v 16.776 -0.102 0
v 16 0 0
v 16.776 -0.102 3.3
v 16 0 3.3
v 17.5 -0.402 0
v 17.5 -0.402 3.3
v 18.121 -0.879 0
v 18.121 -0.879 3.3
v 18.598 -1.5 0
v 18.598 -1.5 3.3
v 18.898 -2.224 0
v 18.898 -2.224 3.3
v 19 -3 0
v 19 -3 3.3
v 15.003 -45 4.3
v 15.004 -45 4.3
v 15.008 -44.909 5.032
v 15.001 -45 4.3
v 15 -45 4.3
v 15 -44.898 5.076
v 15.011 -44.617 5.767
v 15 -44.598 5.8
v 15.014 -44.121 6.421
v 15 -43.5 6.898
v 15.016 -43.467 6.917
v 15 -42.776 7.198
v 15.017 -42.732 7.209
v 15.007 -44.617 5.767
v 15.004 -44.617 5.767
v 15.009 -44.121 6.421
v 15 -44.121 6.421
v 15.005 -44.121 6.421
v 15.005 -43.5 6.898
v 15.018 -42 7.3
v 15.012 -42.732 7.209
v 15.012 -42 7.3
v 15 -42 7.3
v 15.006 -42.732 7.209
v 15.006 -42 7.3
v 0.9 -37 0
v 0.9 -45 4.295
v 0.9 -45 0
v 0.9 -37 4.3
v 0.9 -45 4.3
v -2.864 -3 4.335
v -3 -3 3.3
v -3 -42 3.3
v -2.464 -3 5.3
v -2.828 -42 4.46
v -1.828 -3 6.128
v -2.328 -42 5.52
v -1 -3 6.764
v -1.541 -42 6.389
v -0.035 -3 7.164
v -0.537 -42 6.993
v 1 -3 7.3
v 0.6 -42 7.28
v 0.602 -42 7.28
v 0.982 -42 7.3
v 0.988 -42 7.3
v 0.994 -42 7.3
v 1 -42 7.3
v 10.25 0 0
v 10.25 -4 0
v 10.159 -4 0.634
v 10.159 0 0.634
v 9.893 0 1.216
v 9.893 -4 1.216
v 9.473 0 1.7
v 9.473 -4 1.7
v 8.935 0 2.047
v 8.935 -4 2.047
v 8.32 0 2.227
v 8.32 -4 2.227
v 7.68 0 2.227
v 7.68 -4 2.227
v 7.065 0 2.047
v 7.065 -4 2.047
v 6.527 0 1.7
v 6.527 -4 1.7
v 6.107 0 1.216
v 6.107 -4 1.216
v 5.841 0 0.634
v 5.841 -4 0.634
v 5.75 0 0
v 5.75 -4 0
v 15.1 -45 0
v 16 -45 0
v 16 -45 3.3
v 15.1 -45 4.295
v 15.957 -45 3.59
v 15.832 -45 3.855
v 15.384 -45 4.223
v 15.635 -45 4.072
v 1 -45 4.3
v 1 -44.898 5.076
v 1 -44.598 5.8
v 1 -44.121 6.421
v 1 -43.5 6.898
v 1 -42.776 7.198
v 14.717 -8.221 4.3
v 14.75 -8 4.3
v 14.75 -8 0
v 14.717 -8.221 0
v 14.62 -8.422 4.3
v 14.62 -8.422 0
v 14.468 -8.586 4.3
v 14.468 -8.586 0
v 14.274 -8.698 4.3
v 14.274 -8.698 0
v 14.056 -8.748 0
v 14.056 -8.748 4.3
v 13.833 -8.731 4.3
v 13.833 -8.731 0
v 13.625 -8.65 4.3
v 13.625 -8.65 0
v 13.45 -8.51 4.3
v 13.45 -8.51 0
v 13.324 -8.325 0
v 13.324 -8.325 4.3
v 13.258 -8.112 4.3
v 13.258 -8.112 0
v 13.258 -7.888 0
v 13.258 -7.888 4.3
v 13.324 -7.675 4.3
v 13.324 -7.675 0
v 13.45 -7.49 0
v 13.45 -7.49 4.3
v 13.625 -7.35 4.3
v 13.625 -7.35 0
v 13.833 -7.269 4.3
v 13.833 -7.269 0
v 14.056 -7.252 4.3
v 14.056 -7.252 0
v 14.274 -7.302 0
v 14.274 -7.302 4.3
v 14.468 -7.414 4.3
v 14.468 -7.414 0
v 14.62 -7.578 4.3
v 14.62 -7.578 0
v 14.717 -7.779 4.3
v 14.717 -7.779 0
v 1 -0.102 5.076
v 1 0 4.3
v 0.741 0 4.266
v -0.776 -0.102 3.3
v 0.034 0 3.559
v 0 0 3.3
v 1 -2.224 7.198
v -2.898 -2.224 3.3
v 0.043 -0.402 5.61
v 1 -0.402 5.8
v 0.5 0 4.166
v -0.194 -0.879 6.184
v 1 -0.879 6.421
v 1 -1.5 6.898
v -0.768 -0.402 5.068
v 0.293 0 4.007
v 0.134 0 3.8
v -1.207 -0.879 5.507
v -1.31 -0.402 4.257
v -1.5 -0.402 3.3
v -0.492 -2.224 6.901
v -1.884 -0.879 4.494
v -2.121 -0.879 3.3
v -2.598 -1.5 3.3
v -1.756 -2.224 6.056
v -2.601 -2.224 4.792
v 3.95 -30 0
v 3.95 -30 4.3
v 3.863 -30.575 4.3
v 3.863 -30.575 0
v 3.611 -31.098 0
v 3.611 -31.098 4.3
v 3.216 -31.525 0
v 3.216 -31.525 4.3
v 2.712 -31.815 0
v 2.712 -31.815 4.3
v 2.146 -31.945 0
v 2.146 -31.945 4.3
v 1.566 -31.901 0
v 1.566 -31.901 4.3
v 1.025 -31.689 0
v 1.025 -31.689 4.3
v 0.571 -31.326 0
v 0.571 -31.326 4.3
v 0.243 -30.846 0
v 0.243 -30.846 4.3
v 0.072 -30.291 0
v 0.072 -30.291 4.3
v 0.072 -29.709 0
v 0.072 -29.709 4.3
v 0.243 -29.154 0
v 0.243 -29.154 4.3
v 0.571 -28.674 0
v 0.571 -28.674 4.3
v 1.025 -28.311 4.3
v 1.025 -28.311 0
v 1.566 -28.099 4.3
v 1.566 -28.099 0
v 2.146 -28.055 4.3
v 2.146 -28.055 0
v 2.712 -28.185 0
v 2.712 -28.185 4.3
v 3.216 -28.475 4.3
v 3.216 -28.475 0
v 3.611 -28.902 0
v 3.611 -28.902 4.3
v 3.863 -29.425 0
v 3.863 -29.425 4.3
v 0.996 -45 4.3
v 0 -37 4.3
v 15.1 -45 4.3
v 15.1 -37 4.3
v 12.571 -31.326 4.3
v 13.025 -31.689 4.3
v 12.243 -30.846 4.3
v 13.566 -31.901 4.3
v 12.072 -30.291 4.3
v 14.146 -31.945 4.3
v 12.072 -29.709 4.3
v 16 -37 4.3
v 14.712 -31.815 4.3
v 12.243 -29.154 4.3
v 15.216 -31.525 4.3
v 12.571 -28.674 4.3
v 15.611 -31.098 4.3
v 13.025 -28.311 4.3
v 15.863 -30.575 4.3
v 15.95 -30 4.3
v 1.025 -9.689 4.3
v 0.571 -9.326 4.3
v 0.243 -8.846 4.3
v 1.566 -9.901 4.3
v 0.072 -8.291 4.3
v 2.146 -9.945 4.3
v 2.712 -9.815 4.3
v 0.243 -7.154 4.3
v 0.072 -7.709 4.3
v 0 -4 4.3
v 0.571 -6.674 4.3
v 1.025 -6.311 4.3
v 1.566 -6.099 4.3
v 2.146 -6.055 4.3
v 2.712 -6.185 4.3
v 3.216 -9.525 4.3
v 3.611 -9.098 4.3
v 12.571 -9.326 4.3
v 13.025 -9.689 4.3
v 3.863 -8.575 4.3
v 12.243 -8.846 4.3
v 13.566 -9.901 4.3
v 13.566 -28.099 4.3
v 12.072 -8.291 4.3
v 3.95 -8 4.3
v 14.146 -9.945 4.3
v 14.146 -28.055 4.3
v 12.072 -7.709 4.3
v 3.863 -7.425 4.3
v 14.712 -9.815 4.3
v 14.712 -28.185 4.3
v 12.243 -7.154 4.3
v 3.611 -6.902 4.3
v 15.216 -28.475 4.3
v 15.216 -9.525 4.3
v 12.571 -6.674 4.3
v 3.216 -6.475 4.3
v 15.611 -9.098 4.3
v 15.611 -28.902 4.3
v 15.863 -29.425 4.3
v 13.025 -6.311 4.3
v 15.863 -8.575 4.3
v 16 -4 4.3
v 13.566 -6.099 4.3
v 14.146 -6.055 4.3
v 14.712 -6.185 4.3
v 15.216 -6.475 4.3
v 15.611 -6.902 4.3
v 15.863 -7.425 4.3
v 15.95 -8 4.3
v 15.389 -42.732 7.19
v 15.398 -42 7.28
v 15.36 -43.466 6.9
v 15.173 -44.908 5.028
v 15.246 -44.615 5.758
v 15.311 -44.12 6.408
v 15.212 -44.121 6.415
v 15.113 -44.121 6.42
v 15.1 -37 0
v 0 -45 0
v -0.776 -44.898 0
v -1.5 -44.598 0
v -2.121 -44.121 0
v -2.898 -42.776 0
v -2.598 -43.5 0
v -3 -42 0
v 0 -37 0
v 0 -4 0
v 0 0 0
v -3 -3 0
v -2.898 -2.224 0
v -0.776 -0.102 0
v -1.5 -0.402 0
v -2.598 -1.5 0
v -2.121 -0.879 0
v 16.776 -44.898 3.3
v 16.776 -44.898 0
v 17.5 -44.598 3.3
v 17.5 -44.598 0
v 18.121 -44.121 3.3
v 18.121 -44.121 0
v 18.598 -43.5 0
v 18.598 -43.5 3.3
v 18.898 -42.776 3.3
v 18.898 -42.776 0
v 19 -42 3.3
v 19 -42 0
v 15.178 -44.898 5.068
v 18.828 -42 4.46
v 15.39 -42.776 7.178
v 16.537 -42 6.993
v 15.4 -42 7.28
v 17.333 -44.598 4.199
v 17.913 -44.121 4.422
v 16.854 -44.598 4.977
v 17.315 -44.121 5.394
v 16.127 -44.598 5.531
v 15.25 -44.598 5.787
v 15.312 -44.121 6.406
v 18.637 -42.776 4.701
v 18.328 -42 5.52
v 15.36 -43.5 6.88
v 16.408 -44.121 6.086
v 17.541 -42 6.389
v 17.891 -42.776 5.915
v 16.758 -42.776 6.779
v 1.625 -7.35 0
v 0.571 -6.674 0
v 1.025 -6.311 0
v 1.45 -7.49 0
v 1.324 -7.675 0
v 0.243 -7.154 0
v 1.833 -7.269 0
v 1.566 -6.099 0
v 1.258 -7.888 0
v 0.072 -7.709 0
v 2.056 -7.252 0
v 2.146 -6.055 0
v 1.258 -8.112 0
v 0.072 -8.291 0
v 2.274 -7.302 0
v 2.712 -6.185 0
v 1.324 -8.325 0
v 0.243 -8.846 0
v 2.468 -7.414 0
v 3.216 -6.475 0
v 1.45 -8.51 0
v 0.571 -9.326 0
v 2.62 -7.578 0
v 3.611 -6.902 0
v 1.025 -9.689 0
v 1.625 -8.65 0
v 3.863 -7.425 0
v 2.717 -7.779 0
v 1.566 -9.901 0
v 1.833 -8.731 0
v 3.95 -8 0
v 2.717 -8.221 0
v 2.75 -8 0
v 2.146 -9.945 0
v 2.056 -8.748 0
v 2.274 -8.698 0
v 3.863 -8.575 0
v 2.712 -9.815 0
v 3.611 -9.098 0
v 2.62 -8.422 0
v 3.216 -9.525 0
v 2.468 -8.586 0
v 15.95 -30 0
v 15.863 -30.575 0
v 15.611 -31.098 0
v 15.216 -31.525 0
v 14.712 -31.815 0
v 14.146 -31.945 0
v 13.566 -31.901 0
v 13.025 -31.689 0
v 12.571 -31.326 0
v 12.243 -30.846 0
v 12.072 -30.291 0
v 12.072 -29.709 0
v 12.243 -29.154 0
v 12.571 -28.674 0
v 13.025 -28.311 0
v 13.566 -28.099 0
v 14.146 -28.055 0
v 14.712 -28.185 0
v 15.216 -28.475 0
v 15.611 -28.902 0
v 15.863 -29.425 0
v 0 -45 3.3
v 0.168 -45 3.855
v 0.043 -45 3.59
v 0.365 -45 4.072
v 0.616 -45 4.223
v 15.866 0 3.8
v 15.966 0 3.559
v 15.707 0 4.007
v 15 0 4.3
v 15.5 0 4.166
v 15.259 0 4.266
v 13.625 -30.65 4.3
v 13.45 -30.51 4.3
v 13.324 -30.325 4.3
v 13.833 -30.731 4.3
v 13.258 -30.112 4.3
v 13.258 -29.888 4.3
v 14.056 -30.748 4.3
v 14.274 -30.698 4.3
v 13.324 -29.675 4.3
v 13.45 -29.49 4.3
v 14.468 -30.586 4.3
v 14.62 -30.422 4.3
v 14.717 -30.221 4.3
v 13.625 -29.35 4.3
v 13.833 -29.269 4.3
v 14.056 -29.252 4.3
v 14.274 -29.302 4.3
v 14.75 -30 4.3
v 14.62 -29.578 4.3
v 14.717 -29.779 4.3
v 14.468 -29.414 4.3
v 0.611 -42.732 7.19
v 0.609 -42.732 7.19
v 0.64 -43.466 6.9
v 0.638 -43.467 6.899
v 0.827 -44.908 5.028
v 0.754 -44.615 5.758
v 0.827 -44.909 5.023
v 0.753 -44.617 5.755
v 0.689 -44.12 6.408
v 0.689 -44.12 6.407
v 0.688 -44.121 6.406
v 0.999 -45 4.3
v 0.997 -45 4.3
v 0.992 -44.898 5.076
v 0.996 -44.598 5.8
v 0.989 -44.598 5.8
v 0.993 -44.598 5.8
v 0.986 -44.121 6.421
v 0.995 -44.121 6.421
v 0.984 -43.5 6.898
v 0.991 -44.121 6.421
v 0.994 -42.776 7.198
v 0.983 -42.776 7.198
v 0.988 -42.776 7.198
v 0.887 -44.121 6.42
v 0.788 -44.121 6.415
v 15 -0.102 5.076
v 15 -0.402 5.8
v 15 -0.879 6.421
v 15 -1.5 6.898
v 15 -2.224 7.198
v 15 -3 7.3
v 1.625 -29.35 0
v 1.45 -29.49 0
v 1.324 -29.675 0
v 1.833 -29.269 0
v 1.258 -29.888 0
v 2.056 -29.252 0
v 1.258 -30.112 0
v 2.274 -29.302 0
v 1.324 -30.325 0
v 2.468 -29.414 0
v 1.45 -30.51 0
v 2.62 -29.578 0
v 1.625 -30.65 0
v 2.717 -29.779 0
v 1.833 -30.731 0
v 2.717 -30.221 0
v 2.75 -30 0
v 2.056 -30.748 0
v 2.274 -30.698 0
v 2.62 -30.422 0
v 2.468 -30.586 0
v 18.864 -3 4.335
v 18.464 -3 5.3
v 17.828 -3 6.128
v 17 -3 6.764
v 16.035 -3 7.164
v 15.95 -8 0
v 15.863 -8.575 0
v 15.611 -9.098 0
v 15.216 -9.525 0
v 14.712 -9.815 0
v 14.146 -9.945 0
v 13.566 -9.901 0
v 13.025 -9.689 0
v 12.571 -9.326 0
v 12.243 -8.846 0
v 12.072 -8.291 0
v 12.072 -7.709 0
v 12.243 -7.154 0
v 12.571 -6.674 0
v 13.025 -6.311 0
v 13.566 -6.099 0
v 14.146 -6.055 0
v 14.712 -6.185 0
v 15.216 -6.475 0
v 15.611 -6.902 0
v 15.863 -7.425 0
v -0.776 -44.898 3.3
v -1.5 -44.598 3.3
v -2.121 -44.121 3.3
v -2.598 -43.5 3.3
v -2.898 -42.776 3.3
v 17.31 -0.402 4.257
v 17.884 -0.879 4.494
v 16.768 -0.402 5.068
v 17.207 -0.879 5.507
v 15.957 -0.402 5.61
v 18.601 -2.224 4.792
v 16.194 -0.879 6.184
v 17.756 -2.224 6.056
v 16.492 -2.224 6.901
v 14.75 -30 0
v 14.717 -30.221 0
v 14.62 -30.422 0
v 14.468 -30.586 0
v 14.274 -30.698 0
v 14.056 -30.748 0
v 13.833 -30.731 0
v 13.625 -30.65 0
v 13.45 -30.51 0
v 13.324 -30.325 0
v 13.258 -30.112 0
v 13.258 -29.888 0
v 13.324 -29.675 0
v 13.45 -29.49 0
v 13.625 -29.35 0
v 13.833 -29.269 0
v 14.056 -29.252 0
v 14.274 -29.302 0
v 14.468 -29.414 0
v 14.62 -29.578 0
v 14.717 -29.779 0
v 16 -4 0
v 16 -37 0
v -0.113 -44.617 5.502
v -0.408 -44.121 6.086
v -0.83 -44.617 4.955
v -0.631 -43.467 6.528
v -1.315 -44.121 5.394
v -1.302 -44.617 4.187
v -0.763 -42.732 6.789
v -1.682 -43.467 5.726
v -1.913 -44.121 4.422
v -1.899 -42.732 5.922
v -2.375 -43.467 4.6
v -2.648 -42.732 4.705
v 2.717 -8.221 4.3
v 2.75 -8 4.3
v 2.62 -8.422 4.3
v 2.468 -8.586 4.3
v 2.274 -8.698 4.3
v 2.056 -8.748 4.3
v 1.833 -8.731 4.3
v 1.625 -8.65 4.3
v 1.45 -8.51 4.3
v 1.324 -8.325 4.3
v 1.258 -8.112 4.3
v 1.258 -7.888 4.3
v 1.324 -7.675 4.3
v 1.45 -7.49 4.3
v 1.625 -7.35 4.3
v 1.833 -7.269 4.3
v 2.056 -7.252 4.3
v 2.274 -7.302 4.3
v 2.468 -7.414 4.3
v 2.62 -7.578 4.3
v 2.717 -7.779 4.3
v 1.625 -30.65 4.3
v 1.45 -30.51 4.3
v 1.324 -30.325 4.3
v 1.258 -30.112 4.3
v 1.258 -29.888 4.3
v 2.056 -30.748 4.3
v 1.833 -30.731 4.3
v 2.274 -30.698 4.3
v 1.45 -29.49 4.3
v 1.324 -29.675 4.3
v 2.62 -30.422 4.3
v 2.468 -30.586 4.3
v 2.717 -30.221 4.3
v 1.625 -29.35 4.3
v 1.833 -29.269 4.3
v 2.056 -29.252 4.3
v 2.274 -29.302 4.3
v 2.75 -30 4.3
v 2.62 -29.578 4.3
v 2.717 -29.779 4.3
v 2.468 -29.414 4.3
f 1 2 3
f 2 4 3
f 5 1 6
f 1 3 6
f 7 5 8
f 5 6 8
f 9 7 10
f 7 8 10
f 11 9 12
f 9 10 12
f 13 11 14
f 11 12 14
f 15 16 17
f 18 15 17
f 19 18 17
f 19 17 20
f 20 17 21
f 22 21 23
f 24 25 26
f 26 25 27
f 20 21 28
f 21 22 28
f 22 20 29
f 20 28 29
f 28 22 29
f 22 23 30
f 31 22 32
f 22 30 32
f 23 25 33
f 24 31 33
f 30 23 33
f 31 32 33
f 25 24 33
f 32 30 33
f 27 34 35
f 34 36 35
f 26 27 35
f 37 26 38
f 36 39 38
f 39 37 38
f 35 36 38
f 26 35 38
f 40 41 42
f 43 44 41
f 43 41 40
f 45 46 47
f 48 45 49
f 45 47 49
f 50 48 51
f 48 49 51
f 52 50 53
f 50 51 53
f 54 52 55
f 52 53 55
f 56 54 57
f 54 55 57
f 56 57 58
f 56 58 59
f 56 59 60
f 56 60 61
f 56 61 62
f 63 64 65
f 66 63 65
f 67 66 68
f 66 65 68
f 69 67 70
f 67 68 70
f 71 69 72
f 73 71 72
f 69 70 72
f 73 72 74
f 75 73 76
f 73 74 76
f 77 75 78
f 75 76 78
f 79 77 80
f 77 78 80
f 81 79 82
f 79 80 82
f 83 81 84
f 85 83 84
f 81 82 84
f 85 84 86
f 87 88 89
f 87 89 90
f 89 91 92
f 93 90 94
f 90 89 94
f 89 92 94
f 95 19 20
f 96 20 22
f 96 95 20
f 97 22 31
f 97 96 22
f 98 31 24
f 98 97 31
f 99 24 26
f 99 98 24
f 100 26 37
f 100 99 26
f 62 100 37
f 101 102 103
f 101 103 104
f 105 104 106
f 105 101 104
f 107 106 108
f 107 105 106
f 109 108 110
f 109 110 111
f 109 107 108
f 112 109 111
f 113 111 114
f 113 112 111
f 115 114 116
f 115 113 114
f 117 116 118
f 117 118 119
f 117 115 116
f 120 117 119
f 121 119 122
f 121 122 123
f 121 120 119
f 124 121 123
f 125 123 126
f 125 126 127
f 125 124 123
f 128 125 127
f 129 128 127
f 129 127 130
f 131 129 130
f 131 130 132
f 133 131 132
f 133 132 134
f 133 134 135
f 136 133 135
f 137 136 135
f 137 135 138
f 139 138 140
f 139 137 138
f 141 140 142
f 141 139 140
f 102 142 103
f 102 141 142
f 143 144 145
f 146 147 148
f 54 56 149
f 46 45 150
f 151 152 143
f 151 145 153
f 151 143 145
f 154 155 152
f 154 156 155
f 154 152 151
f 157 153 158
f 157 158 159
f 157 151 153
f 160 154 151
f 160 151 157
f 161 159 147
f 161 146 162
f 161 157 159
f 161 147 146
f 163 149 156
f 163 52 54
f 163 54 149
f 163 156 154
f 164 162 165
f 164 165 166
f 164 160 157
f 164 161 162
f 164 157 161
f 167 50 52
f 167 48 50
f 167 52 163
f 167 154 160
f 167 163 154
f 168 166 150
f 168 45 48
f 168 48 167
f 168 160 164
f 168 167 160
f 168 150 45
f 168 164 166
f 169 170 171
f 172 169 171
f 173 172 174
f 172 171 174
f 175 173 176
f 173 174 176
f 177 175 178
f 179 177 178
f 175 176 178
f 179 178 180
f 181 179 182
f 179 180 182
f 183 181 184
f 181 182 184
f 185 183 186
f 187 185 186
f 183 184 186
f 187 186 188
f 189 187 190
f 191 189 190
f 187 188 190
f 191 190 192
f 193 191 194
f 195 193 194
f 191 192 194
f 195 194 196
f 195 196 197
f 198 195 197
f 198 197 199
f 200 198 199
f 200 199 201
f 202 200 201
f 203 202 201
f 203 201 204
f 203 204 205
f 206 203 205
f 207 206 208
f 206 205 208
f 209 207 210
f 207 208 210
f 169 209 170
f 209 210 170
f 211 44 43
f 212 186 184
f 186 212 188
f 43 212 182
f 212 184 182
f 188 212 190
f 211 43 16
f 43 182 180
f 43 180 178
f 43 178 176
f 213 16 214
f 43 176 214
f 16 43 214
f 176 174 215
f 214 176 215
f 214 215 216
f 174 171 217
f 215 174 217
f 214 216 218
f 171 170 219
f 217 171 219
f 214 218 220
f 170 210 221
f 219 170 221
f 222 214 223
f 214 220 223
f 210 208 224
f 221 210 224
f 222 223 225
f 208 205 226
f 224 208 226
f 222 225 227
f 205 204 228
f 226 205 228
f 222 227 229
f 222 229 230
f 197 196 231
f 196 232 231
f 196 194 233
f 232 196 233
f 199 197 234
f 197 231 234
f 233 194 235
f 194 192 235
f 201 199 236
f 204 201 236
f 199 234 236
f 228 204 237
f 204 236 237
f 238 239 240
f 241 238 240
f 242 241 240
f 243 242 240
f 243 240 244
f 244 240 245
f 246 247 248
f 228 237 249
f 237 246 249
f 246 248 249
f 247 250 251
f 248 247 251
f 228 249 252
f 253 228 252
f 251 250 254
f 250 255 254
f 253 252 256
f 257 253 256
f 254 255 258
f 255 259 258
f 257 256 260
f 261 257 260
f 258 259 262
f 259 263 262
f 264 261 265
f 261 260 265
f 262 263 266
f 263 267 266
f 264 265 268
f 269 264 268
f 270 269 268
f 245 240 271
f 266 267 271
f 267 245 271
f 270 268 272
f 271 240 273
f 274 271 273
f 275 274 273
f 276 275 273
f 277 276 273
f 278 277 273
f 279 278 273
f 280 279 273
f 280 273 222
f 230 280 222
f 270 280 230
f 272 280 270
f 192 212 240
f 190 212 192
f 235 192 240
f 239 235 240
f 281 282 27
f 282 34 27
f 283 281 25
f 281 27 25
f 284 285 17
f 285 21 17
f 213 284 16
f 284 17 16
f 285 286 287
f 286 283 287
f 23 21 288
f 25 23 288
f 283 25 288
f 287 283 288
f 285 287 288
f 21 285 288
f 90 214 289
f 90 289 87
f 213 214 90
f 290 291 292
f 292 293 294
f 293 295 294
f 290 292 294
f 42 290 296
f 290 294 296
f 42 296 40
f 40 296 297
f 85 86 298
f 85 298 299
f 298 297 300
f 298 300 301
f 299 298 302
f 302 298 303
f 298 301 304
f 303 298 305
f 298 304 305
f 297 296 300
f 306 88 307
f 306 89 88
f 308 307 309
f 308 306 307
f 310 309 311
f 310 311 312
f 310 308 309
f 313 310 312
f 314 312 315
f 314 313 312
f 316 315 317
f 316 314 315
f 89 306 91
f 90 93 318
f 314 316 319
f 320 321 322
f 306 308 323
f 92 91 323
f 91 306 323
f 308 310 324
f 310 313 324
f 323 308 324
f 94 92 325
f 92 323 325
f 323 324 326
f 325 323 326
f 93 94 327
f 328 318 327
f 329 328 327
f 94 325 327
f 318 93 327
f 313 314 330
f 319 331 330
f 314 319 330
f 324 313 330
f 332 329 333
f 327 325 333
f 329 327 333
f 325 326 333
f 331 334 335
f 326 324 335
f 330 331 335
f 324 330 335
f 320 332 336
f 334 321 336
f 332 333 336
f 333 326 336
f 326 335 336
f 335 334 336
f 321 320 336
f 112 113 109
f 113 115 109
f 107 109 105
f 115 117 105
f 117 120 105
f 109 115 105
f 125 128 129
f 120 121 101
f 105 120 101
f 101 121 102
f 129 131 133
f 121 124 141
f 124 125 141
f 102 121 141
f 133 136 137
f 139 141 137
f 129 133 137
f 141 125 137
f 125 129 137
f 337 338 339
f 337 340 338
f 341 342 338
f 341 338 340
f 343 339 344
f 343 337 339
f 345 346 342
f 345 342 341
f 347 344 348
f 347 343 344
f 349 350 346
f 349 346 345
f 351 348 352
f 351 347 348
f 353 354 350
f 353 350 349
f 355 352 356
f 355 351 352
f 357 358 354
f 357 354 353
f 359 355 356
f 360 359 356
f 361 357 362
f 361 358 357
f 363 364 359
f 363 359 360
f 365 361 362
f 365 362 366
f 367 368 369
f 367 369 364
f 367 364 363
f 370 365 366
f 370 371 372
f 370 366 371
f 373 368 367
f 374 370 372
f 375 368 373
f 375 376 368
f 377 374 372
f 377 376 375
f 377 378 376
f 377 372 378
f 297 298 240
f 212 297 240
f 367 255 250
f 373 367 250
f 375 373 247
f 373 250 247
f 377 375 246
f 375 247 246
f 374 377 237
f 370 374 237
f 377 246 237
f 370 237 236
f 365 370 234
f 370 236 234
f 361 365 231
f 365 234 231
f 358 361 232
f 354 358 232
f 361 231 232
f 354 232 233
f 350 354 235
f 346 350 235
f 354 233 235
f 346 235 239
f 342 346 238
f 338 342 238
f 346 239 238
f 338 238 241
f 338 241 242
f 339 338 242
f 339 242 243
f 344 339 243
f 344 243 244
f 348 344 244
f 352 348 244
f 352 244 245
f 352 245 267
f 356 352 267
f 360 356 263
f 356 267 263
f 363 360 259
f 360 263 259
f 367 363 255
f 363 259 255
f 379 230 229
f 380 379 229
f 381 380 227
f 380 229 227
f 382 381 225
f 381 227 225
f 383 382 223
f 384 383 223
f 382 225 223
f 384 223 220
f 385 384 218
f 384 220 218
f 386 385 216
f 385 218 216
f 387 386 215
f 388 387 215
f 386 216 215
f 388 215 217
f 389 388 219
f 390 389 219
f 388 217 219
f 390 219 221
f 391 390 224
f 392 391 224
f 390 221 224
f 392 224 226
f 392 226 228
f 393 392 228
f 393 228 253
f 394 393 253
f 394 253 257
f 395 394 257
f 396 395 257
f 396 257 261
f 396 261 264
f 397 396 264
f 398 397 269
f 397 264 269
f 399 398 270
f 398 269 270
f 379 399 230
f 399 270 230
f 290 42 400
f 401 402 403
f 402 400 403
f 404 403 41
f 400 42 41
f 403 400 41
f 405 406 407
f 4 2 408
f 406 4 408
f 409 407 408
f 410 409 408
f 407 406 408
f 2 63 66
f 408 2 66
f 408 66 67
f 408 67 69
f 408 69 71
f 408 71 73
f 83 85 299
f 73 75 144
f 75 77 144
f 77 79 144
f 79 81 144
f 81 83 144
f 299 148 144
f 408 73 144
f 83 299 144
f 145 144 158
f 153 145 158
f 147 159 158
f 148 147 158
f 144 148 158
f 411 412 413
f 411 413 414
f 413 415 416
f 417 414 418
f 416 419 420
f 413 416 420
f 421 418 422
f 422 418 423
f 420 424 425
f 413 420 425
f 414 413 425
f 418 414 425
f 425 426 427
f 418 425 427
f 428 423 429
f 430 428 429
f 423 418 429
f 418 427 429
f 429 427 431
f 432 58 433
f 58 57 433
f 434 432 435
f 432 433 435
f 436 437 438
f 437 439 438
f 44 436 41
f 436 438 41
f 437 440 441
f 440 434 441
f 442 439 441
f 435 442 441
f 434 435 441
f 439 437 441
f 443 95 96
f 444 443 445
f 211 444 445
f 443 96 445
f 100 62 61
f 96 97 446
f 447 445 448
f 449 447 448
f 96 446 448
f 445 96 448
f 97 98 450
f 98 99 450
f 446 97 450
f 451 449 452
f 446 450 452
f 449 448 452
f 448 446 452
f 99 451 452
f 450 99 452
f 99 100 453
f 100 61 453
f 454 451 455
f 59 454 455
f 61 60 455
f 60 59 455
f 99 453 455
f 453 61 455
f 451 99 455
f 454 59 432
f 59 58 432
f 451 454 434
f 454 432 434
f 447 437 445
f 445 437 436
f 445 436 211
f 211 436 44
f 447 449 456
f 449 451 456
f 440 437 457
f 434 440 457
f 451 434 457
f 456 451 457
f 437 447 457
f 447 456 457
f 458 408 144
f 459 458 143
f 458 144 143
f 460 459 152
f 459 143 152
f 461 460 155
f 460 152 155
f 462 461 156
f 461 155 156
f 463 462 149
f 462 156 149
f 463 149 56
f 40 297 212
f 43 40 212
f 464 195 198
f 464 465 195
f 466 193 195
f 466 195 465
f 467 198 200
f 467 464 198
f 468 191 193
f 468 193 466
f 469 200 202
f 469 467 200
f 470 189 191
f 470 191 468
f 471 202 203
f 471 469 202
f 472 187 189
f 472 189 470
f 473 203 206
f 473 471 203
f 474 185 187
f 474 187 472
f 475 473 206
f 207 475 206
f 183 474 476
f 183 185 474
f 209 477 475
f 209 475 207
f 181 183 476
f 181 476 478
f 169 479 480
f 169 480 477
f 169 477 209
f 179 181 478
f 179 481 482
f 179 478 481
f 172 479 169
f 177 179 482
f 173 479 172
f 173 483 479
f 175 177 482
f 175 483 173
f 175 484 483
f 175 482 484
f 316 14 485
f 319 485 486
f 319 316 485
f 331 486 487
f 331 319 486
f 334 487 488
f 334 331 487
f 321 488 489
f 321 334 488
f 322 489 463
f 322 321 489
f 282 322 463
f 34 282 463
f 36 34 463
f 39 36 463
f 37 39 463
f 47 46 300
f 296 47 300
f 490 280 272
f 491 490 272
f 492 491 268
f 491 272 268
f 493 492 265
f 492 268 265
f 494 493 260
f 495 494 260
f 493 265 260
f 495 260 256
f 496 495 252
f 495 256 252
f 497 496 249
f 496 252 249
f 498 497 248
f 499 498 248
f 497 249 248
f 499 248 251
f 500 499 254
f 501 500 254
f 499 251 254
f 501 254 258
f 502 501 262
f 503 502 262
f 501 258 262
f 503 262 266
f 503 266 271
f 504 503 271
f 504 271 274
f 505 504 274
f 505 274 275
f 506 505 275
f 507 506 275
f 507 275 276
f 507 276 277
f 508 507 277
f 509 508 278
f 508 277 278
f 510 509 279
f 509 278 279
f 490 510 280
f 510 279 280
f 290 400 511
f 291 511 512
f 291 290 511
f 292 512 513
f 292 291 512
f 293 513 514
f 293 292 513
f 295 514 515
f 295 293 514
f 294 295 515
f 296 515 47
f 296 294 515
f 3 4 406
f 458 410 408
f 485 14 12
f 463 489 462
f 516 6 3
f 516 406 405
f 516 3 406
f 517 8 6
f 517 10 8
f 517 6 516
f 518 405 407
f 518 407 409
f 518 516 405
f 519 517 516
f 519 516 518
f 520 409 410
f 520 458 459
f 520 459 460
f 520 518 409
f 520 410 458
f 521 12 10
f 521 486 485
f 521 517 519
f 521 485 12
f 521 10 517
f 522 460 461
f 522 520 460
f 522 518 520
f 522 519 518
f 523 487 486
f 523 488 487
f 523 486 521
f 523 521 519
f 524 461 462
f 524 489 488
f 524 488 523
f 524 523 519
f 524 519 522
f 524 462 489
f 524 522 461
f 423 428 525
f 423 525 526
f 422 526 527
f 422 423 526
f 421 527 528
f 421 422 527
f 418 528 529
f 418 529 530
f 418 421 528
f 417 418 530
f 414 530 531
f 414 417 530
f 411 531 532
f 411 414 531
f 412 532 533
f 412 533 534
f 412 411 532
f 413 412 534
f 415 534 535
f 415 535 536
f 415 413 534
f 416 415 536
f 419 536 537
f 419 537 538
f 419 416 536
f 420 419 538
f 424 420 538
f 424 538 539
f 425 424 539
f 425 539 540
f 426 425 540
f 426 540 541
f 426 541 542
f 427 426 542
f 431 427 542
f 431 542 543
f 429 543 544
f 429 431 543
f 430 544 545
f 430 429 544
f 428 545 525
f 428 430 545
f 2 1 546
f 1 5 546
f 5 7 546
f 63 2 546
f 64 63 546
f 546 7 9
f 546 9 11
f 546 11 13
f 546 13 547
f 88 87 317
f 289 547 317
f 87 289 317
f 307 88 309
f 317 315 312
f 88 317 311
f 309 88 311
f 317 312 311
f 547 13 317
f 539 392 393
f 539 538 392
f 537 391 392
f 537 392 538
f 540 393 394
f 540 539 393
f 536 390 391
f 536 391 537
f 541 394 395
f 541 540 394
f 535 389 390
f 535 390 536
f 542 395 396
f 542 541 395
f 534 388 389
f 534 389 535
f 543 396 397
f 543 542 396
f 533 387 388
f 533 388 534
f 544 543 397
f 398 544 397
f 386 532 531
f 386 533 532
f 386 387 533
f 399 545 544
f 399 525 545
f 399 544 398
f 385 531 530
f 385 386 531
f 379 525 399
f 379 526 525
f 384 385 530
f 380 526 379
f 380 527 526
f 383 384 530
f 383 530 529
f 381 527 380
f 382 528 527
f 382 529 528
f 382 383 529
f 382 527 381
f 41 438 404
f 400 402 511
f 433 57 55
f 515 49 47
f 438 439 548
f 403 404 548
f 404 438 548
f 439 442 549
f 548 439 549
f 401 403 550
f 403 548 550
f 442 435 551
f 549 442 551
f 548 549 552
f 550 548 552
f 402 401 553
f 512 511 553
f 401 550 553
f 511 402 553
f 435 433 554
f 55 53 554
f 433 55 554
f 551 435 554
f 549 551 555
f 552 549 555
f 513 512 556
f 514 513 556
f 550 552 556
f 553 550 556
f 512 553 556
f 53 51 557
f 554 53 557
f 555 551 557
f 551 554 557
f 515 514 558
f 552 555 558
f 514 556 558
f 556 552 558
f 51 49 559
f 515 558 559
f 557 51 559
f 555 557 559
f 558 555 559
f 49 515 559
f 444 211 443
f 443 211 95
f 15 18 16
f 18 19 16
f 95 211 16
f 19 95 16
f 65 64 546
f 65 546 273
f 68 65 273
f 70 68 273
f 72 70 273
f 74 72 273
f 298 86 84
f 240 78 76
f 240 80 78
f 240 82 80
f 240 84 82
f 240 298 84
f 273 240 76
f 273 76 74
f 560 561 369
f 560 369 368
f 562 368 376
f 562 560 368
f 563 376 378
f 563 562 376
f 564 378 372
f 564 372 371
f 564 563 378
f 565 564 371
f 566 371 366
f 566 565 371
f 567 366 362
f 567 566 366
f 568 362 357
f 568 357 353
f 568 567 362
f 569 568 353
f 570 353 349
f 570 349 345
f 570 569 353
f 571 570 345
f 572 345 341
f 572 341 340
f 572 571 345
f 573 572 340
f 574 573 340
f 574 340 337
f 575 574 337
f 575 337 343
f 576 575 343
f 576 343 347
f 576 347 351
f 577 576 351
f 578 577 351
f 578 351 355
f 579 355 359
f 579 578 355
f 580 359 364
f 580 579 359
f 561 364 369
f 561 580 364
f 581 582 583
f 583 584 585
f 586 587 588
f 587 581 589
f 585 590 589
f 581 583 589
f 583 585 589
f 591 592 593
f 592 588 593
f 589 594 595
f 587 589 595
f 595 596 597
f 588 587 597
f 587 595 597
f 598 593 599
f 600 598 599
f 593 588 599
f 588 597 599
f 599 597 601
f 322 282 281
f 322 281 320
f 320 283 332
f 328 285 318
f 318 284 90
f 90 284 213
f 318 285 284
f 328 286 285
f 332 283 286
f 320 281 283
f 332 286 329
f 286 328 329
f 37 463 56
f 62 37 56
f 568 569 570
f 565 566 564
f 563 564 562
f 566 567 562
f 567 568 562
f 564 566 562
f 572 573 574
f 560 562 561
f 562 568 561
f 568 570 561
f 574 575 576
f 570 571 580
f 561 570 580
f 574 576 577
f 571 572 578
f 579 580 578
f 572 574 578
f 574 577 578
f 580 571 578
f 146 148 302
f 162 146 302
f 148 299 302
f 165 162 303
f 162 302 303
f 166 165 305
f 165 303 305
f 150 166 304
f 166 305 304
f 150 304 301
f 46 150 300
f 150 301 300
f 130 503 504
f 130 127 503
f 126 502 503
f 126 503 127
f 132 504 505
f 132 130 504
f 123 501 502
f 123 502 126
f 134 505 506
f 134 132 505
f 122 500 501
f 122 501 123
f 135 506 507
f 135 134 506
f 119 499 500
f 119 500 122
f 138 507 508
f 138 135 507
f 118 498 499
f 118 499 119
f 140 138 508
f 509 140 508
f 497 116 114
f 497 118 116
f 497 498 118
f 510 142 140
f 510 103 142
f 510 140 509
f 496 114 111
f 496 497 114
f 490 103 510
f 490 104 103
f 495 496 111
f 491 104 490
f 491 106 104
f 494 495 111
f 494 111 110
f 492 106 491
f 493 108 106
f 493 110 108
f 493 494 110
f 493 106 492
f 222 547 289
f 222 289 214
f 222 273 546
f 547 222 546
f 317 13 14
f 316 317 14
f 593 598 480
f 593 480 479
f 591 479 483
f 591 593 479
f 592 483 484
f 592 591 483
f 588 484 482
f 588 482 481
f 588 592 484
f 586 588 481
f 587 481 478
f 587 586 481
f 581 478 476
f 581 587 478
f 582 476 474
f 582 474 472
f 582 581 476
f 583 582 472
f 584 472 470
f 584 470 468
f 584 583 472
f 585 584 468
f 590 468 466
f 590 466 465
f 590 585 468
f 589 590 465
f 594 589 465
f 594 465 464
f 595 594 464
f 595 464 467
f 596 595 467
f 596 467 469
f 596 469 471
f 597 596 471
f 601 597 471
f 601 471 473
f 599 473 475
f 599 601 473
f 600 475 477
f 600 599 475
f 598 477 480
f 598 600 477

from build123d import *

# Parameters (mm, degrees)
F1_DEPTH  = 45
F3_W      = 4
F3_H      = 4.3
F4_DEPTH  = 16
F6_D      = 4.5
F6_DEPTH  = 30
F6_TIP    = 1.3519363928
F8_R      = 4
F11_W     = 8
F11_H     = 4.3
F12_DEPTH = 0.9
F13_W     = 8
F13_H     = 4.3
F14_DEPTH = 0.9
F15_R     = 2.99999
F2_R      = 1.95
F2_R_2    = 0.75
F16_DEPTH = 4.3


# Not quite as in the source:
# - a fillet or chamfer is up to 0.001 mm smaller than in the source, because OpenCascade refuses the exact size


with BuildPart() as f1:
    # F0 (on Front) → F1 (new body)
    with BuildSketch(Plane.XZ):
        Polygon((0, 0), (0, 4.3), (16, 4.3), (16, 0), (19, 0), (19, 7.3), (-3, 7.3), (-3, 0), align=None)
    extrude(amount=F1_DEPTH)

    # F3 (on face) → F4 (join)
    with BuildSketch(Plane.YZ):
        with Locations((-2, 2.15)):
            Rectangle(F3_W, F3_H)
    extrude(amount=F4_DEPTH)

    # F6
    with Locations(Plane(origin=(0, 0, 0), x_dir=(-1, 0, 0), z_dir=(0, 1, 0))):
        with Locations((-8, 0)):
            Hole(F6_D / 2, depth=F6_DEPTH)
            with Locations((0, 0, -(F6_DEPTH + F6_TIP / 2))):  # 118° drill point
                Cone(0, F6_D / 2, F6_TIP, mode=Mode.SUBTRACT)


with BuildPart() as f7_1:
    # F7: copy of F1
    add(f1.part.moved(Location((31.9, 0.1, 0))))


with BuildPart() as f1_1:
    add(f1.part)

    # F8
    f8_edges = [f1_1.edges().sort_by_distance(p)[0] for p in [
        (-3, -22.5, 7.3),
        (19, -22.5, 7.3),
    ]]
    fillet(f8_edges, radius=F8_R)


with BuildPart() as f10_1:
    # F10: copy of F1
    add(f1_1.part.moved(Location((35.6, 1.7, 0))))


with BuildPart() as f1_2:
    add(f1_1.part)

    # F11 (on face) → F12 (join)
    with BuildSketch(Plane.YZ):
        with Locations((-41, 2.15)):
            Rectangle(F11_W, F11_H)
    extrude(amount=F12_DEPTH)

    # F13 (on face) → F14 (join)
    with BuildSketch(Plane(origin=(16, 0, 0), x_dir=(0, -1, 0), z_dir=(-1, 0, 0))):
        with Locations((41, 2.15)):
            Rectangle(F13_W, F13_H)
    extrude(amount=F14_DEPTH)

    # F15 (radius 3 in the source; OpenCascade refuses exactly that, so slightly less here)
    f15_edges = [f1_2.edges().sort_by_distance(p)[0] for p in [
        (8, -45, 7.3),
        (8, 0, 7.3),
    ]]
    fillet(f15_edges, radius=F15_R)

    # F2 (on face) → F16 (join)
    with BuildSketch(Plane(origin=(0, 0, 4.3), x_dir=(1, 0, 0), z_dir=(0, 0, -1))):
        with Locations((2, 30)):
            Circle(F2_R)
        with Locations((2, 30)):
            Circle(F2_R_2, mode=Mode.SUBTRACT)
        with Locations((14, 30)):
            Circle(F2_R)
        with Locations((14, 30)):
            Circle(F2_R_2, mode=Mode.SUBTRACT)
        with Locations((2, 8)):
            Circle(F2_R)
        with Locations((2, 8)):
            Circle(F2_R_2, mode=Mode.SUBTRACT)
        with Locations((14, 8)):
            Circle(F2_R)
        with Locations((14, 8)):
            Circle(F2_R_2, mode=Mode.SUBTRACT)
    extrude(amount=F16_DEPTH)


solid = f1_2.part
